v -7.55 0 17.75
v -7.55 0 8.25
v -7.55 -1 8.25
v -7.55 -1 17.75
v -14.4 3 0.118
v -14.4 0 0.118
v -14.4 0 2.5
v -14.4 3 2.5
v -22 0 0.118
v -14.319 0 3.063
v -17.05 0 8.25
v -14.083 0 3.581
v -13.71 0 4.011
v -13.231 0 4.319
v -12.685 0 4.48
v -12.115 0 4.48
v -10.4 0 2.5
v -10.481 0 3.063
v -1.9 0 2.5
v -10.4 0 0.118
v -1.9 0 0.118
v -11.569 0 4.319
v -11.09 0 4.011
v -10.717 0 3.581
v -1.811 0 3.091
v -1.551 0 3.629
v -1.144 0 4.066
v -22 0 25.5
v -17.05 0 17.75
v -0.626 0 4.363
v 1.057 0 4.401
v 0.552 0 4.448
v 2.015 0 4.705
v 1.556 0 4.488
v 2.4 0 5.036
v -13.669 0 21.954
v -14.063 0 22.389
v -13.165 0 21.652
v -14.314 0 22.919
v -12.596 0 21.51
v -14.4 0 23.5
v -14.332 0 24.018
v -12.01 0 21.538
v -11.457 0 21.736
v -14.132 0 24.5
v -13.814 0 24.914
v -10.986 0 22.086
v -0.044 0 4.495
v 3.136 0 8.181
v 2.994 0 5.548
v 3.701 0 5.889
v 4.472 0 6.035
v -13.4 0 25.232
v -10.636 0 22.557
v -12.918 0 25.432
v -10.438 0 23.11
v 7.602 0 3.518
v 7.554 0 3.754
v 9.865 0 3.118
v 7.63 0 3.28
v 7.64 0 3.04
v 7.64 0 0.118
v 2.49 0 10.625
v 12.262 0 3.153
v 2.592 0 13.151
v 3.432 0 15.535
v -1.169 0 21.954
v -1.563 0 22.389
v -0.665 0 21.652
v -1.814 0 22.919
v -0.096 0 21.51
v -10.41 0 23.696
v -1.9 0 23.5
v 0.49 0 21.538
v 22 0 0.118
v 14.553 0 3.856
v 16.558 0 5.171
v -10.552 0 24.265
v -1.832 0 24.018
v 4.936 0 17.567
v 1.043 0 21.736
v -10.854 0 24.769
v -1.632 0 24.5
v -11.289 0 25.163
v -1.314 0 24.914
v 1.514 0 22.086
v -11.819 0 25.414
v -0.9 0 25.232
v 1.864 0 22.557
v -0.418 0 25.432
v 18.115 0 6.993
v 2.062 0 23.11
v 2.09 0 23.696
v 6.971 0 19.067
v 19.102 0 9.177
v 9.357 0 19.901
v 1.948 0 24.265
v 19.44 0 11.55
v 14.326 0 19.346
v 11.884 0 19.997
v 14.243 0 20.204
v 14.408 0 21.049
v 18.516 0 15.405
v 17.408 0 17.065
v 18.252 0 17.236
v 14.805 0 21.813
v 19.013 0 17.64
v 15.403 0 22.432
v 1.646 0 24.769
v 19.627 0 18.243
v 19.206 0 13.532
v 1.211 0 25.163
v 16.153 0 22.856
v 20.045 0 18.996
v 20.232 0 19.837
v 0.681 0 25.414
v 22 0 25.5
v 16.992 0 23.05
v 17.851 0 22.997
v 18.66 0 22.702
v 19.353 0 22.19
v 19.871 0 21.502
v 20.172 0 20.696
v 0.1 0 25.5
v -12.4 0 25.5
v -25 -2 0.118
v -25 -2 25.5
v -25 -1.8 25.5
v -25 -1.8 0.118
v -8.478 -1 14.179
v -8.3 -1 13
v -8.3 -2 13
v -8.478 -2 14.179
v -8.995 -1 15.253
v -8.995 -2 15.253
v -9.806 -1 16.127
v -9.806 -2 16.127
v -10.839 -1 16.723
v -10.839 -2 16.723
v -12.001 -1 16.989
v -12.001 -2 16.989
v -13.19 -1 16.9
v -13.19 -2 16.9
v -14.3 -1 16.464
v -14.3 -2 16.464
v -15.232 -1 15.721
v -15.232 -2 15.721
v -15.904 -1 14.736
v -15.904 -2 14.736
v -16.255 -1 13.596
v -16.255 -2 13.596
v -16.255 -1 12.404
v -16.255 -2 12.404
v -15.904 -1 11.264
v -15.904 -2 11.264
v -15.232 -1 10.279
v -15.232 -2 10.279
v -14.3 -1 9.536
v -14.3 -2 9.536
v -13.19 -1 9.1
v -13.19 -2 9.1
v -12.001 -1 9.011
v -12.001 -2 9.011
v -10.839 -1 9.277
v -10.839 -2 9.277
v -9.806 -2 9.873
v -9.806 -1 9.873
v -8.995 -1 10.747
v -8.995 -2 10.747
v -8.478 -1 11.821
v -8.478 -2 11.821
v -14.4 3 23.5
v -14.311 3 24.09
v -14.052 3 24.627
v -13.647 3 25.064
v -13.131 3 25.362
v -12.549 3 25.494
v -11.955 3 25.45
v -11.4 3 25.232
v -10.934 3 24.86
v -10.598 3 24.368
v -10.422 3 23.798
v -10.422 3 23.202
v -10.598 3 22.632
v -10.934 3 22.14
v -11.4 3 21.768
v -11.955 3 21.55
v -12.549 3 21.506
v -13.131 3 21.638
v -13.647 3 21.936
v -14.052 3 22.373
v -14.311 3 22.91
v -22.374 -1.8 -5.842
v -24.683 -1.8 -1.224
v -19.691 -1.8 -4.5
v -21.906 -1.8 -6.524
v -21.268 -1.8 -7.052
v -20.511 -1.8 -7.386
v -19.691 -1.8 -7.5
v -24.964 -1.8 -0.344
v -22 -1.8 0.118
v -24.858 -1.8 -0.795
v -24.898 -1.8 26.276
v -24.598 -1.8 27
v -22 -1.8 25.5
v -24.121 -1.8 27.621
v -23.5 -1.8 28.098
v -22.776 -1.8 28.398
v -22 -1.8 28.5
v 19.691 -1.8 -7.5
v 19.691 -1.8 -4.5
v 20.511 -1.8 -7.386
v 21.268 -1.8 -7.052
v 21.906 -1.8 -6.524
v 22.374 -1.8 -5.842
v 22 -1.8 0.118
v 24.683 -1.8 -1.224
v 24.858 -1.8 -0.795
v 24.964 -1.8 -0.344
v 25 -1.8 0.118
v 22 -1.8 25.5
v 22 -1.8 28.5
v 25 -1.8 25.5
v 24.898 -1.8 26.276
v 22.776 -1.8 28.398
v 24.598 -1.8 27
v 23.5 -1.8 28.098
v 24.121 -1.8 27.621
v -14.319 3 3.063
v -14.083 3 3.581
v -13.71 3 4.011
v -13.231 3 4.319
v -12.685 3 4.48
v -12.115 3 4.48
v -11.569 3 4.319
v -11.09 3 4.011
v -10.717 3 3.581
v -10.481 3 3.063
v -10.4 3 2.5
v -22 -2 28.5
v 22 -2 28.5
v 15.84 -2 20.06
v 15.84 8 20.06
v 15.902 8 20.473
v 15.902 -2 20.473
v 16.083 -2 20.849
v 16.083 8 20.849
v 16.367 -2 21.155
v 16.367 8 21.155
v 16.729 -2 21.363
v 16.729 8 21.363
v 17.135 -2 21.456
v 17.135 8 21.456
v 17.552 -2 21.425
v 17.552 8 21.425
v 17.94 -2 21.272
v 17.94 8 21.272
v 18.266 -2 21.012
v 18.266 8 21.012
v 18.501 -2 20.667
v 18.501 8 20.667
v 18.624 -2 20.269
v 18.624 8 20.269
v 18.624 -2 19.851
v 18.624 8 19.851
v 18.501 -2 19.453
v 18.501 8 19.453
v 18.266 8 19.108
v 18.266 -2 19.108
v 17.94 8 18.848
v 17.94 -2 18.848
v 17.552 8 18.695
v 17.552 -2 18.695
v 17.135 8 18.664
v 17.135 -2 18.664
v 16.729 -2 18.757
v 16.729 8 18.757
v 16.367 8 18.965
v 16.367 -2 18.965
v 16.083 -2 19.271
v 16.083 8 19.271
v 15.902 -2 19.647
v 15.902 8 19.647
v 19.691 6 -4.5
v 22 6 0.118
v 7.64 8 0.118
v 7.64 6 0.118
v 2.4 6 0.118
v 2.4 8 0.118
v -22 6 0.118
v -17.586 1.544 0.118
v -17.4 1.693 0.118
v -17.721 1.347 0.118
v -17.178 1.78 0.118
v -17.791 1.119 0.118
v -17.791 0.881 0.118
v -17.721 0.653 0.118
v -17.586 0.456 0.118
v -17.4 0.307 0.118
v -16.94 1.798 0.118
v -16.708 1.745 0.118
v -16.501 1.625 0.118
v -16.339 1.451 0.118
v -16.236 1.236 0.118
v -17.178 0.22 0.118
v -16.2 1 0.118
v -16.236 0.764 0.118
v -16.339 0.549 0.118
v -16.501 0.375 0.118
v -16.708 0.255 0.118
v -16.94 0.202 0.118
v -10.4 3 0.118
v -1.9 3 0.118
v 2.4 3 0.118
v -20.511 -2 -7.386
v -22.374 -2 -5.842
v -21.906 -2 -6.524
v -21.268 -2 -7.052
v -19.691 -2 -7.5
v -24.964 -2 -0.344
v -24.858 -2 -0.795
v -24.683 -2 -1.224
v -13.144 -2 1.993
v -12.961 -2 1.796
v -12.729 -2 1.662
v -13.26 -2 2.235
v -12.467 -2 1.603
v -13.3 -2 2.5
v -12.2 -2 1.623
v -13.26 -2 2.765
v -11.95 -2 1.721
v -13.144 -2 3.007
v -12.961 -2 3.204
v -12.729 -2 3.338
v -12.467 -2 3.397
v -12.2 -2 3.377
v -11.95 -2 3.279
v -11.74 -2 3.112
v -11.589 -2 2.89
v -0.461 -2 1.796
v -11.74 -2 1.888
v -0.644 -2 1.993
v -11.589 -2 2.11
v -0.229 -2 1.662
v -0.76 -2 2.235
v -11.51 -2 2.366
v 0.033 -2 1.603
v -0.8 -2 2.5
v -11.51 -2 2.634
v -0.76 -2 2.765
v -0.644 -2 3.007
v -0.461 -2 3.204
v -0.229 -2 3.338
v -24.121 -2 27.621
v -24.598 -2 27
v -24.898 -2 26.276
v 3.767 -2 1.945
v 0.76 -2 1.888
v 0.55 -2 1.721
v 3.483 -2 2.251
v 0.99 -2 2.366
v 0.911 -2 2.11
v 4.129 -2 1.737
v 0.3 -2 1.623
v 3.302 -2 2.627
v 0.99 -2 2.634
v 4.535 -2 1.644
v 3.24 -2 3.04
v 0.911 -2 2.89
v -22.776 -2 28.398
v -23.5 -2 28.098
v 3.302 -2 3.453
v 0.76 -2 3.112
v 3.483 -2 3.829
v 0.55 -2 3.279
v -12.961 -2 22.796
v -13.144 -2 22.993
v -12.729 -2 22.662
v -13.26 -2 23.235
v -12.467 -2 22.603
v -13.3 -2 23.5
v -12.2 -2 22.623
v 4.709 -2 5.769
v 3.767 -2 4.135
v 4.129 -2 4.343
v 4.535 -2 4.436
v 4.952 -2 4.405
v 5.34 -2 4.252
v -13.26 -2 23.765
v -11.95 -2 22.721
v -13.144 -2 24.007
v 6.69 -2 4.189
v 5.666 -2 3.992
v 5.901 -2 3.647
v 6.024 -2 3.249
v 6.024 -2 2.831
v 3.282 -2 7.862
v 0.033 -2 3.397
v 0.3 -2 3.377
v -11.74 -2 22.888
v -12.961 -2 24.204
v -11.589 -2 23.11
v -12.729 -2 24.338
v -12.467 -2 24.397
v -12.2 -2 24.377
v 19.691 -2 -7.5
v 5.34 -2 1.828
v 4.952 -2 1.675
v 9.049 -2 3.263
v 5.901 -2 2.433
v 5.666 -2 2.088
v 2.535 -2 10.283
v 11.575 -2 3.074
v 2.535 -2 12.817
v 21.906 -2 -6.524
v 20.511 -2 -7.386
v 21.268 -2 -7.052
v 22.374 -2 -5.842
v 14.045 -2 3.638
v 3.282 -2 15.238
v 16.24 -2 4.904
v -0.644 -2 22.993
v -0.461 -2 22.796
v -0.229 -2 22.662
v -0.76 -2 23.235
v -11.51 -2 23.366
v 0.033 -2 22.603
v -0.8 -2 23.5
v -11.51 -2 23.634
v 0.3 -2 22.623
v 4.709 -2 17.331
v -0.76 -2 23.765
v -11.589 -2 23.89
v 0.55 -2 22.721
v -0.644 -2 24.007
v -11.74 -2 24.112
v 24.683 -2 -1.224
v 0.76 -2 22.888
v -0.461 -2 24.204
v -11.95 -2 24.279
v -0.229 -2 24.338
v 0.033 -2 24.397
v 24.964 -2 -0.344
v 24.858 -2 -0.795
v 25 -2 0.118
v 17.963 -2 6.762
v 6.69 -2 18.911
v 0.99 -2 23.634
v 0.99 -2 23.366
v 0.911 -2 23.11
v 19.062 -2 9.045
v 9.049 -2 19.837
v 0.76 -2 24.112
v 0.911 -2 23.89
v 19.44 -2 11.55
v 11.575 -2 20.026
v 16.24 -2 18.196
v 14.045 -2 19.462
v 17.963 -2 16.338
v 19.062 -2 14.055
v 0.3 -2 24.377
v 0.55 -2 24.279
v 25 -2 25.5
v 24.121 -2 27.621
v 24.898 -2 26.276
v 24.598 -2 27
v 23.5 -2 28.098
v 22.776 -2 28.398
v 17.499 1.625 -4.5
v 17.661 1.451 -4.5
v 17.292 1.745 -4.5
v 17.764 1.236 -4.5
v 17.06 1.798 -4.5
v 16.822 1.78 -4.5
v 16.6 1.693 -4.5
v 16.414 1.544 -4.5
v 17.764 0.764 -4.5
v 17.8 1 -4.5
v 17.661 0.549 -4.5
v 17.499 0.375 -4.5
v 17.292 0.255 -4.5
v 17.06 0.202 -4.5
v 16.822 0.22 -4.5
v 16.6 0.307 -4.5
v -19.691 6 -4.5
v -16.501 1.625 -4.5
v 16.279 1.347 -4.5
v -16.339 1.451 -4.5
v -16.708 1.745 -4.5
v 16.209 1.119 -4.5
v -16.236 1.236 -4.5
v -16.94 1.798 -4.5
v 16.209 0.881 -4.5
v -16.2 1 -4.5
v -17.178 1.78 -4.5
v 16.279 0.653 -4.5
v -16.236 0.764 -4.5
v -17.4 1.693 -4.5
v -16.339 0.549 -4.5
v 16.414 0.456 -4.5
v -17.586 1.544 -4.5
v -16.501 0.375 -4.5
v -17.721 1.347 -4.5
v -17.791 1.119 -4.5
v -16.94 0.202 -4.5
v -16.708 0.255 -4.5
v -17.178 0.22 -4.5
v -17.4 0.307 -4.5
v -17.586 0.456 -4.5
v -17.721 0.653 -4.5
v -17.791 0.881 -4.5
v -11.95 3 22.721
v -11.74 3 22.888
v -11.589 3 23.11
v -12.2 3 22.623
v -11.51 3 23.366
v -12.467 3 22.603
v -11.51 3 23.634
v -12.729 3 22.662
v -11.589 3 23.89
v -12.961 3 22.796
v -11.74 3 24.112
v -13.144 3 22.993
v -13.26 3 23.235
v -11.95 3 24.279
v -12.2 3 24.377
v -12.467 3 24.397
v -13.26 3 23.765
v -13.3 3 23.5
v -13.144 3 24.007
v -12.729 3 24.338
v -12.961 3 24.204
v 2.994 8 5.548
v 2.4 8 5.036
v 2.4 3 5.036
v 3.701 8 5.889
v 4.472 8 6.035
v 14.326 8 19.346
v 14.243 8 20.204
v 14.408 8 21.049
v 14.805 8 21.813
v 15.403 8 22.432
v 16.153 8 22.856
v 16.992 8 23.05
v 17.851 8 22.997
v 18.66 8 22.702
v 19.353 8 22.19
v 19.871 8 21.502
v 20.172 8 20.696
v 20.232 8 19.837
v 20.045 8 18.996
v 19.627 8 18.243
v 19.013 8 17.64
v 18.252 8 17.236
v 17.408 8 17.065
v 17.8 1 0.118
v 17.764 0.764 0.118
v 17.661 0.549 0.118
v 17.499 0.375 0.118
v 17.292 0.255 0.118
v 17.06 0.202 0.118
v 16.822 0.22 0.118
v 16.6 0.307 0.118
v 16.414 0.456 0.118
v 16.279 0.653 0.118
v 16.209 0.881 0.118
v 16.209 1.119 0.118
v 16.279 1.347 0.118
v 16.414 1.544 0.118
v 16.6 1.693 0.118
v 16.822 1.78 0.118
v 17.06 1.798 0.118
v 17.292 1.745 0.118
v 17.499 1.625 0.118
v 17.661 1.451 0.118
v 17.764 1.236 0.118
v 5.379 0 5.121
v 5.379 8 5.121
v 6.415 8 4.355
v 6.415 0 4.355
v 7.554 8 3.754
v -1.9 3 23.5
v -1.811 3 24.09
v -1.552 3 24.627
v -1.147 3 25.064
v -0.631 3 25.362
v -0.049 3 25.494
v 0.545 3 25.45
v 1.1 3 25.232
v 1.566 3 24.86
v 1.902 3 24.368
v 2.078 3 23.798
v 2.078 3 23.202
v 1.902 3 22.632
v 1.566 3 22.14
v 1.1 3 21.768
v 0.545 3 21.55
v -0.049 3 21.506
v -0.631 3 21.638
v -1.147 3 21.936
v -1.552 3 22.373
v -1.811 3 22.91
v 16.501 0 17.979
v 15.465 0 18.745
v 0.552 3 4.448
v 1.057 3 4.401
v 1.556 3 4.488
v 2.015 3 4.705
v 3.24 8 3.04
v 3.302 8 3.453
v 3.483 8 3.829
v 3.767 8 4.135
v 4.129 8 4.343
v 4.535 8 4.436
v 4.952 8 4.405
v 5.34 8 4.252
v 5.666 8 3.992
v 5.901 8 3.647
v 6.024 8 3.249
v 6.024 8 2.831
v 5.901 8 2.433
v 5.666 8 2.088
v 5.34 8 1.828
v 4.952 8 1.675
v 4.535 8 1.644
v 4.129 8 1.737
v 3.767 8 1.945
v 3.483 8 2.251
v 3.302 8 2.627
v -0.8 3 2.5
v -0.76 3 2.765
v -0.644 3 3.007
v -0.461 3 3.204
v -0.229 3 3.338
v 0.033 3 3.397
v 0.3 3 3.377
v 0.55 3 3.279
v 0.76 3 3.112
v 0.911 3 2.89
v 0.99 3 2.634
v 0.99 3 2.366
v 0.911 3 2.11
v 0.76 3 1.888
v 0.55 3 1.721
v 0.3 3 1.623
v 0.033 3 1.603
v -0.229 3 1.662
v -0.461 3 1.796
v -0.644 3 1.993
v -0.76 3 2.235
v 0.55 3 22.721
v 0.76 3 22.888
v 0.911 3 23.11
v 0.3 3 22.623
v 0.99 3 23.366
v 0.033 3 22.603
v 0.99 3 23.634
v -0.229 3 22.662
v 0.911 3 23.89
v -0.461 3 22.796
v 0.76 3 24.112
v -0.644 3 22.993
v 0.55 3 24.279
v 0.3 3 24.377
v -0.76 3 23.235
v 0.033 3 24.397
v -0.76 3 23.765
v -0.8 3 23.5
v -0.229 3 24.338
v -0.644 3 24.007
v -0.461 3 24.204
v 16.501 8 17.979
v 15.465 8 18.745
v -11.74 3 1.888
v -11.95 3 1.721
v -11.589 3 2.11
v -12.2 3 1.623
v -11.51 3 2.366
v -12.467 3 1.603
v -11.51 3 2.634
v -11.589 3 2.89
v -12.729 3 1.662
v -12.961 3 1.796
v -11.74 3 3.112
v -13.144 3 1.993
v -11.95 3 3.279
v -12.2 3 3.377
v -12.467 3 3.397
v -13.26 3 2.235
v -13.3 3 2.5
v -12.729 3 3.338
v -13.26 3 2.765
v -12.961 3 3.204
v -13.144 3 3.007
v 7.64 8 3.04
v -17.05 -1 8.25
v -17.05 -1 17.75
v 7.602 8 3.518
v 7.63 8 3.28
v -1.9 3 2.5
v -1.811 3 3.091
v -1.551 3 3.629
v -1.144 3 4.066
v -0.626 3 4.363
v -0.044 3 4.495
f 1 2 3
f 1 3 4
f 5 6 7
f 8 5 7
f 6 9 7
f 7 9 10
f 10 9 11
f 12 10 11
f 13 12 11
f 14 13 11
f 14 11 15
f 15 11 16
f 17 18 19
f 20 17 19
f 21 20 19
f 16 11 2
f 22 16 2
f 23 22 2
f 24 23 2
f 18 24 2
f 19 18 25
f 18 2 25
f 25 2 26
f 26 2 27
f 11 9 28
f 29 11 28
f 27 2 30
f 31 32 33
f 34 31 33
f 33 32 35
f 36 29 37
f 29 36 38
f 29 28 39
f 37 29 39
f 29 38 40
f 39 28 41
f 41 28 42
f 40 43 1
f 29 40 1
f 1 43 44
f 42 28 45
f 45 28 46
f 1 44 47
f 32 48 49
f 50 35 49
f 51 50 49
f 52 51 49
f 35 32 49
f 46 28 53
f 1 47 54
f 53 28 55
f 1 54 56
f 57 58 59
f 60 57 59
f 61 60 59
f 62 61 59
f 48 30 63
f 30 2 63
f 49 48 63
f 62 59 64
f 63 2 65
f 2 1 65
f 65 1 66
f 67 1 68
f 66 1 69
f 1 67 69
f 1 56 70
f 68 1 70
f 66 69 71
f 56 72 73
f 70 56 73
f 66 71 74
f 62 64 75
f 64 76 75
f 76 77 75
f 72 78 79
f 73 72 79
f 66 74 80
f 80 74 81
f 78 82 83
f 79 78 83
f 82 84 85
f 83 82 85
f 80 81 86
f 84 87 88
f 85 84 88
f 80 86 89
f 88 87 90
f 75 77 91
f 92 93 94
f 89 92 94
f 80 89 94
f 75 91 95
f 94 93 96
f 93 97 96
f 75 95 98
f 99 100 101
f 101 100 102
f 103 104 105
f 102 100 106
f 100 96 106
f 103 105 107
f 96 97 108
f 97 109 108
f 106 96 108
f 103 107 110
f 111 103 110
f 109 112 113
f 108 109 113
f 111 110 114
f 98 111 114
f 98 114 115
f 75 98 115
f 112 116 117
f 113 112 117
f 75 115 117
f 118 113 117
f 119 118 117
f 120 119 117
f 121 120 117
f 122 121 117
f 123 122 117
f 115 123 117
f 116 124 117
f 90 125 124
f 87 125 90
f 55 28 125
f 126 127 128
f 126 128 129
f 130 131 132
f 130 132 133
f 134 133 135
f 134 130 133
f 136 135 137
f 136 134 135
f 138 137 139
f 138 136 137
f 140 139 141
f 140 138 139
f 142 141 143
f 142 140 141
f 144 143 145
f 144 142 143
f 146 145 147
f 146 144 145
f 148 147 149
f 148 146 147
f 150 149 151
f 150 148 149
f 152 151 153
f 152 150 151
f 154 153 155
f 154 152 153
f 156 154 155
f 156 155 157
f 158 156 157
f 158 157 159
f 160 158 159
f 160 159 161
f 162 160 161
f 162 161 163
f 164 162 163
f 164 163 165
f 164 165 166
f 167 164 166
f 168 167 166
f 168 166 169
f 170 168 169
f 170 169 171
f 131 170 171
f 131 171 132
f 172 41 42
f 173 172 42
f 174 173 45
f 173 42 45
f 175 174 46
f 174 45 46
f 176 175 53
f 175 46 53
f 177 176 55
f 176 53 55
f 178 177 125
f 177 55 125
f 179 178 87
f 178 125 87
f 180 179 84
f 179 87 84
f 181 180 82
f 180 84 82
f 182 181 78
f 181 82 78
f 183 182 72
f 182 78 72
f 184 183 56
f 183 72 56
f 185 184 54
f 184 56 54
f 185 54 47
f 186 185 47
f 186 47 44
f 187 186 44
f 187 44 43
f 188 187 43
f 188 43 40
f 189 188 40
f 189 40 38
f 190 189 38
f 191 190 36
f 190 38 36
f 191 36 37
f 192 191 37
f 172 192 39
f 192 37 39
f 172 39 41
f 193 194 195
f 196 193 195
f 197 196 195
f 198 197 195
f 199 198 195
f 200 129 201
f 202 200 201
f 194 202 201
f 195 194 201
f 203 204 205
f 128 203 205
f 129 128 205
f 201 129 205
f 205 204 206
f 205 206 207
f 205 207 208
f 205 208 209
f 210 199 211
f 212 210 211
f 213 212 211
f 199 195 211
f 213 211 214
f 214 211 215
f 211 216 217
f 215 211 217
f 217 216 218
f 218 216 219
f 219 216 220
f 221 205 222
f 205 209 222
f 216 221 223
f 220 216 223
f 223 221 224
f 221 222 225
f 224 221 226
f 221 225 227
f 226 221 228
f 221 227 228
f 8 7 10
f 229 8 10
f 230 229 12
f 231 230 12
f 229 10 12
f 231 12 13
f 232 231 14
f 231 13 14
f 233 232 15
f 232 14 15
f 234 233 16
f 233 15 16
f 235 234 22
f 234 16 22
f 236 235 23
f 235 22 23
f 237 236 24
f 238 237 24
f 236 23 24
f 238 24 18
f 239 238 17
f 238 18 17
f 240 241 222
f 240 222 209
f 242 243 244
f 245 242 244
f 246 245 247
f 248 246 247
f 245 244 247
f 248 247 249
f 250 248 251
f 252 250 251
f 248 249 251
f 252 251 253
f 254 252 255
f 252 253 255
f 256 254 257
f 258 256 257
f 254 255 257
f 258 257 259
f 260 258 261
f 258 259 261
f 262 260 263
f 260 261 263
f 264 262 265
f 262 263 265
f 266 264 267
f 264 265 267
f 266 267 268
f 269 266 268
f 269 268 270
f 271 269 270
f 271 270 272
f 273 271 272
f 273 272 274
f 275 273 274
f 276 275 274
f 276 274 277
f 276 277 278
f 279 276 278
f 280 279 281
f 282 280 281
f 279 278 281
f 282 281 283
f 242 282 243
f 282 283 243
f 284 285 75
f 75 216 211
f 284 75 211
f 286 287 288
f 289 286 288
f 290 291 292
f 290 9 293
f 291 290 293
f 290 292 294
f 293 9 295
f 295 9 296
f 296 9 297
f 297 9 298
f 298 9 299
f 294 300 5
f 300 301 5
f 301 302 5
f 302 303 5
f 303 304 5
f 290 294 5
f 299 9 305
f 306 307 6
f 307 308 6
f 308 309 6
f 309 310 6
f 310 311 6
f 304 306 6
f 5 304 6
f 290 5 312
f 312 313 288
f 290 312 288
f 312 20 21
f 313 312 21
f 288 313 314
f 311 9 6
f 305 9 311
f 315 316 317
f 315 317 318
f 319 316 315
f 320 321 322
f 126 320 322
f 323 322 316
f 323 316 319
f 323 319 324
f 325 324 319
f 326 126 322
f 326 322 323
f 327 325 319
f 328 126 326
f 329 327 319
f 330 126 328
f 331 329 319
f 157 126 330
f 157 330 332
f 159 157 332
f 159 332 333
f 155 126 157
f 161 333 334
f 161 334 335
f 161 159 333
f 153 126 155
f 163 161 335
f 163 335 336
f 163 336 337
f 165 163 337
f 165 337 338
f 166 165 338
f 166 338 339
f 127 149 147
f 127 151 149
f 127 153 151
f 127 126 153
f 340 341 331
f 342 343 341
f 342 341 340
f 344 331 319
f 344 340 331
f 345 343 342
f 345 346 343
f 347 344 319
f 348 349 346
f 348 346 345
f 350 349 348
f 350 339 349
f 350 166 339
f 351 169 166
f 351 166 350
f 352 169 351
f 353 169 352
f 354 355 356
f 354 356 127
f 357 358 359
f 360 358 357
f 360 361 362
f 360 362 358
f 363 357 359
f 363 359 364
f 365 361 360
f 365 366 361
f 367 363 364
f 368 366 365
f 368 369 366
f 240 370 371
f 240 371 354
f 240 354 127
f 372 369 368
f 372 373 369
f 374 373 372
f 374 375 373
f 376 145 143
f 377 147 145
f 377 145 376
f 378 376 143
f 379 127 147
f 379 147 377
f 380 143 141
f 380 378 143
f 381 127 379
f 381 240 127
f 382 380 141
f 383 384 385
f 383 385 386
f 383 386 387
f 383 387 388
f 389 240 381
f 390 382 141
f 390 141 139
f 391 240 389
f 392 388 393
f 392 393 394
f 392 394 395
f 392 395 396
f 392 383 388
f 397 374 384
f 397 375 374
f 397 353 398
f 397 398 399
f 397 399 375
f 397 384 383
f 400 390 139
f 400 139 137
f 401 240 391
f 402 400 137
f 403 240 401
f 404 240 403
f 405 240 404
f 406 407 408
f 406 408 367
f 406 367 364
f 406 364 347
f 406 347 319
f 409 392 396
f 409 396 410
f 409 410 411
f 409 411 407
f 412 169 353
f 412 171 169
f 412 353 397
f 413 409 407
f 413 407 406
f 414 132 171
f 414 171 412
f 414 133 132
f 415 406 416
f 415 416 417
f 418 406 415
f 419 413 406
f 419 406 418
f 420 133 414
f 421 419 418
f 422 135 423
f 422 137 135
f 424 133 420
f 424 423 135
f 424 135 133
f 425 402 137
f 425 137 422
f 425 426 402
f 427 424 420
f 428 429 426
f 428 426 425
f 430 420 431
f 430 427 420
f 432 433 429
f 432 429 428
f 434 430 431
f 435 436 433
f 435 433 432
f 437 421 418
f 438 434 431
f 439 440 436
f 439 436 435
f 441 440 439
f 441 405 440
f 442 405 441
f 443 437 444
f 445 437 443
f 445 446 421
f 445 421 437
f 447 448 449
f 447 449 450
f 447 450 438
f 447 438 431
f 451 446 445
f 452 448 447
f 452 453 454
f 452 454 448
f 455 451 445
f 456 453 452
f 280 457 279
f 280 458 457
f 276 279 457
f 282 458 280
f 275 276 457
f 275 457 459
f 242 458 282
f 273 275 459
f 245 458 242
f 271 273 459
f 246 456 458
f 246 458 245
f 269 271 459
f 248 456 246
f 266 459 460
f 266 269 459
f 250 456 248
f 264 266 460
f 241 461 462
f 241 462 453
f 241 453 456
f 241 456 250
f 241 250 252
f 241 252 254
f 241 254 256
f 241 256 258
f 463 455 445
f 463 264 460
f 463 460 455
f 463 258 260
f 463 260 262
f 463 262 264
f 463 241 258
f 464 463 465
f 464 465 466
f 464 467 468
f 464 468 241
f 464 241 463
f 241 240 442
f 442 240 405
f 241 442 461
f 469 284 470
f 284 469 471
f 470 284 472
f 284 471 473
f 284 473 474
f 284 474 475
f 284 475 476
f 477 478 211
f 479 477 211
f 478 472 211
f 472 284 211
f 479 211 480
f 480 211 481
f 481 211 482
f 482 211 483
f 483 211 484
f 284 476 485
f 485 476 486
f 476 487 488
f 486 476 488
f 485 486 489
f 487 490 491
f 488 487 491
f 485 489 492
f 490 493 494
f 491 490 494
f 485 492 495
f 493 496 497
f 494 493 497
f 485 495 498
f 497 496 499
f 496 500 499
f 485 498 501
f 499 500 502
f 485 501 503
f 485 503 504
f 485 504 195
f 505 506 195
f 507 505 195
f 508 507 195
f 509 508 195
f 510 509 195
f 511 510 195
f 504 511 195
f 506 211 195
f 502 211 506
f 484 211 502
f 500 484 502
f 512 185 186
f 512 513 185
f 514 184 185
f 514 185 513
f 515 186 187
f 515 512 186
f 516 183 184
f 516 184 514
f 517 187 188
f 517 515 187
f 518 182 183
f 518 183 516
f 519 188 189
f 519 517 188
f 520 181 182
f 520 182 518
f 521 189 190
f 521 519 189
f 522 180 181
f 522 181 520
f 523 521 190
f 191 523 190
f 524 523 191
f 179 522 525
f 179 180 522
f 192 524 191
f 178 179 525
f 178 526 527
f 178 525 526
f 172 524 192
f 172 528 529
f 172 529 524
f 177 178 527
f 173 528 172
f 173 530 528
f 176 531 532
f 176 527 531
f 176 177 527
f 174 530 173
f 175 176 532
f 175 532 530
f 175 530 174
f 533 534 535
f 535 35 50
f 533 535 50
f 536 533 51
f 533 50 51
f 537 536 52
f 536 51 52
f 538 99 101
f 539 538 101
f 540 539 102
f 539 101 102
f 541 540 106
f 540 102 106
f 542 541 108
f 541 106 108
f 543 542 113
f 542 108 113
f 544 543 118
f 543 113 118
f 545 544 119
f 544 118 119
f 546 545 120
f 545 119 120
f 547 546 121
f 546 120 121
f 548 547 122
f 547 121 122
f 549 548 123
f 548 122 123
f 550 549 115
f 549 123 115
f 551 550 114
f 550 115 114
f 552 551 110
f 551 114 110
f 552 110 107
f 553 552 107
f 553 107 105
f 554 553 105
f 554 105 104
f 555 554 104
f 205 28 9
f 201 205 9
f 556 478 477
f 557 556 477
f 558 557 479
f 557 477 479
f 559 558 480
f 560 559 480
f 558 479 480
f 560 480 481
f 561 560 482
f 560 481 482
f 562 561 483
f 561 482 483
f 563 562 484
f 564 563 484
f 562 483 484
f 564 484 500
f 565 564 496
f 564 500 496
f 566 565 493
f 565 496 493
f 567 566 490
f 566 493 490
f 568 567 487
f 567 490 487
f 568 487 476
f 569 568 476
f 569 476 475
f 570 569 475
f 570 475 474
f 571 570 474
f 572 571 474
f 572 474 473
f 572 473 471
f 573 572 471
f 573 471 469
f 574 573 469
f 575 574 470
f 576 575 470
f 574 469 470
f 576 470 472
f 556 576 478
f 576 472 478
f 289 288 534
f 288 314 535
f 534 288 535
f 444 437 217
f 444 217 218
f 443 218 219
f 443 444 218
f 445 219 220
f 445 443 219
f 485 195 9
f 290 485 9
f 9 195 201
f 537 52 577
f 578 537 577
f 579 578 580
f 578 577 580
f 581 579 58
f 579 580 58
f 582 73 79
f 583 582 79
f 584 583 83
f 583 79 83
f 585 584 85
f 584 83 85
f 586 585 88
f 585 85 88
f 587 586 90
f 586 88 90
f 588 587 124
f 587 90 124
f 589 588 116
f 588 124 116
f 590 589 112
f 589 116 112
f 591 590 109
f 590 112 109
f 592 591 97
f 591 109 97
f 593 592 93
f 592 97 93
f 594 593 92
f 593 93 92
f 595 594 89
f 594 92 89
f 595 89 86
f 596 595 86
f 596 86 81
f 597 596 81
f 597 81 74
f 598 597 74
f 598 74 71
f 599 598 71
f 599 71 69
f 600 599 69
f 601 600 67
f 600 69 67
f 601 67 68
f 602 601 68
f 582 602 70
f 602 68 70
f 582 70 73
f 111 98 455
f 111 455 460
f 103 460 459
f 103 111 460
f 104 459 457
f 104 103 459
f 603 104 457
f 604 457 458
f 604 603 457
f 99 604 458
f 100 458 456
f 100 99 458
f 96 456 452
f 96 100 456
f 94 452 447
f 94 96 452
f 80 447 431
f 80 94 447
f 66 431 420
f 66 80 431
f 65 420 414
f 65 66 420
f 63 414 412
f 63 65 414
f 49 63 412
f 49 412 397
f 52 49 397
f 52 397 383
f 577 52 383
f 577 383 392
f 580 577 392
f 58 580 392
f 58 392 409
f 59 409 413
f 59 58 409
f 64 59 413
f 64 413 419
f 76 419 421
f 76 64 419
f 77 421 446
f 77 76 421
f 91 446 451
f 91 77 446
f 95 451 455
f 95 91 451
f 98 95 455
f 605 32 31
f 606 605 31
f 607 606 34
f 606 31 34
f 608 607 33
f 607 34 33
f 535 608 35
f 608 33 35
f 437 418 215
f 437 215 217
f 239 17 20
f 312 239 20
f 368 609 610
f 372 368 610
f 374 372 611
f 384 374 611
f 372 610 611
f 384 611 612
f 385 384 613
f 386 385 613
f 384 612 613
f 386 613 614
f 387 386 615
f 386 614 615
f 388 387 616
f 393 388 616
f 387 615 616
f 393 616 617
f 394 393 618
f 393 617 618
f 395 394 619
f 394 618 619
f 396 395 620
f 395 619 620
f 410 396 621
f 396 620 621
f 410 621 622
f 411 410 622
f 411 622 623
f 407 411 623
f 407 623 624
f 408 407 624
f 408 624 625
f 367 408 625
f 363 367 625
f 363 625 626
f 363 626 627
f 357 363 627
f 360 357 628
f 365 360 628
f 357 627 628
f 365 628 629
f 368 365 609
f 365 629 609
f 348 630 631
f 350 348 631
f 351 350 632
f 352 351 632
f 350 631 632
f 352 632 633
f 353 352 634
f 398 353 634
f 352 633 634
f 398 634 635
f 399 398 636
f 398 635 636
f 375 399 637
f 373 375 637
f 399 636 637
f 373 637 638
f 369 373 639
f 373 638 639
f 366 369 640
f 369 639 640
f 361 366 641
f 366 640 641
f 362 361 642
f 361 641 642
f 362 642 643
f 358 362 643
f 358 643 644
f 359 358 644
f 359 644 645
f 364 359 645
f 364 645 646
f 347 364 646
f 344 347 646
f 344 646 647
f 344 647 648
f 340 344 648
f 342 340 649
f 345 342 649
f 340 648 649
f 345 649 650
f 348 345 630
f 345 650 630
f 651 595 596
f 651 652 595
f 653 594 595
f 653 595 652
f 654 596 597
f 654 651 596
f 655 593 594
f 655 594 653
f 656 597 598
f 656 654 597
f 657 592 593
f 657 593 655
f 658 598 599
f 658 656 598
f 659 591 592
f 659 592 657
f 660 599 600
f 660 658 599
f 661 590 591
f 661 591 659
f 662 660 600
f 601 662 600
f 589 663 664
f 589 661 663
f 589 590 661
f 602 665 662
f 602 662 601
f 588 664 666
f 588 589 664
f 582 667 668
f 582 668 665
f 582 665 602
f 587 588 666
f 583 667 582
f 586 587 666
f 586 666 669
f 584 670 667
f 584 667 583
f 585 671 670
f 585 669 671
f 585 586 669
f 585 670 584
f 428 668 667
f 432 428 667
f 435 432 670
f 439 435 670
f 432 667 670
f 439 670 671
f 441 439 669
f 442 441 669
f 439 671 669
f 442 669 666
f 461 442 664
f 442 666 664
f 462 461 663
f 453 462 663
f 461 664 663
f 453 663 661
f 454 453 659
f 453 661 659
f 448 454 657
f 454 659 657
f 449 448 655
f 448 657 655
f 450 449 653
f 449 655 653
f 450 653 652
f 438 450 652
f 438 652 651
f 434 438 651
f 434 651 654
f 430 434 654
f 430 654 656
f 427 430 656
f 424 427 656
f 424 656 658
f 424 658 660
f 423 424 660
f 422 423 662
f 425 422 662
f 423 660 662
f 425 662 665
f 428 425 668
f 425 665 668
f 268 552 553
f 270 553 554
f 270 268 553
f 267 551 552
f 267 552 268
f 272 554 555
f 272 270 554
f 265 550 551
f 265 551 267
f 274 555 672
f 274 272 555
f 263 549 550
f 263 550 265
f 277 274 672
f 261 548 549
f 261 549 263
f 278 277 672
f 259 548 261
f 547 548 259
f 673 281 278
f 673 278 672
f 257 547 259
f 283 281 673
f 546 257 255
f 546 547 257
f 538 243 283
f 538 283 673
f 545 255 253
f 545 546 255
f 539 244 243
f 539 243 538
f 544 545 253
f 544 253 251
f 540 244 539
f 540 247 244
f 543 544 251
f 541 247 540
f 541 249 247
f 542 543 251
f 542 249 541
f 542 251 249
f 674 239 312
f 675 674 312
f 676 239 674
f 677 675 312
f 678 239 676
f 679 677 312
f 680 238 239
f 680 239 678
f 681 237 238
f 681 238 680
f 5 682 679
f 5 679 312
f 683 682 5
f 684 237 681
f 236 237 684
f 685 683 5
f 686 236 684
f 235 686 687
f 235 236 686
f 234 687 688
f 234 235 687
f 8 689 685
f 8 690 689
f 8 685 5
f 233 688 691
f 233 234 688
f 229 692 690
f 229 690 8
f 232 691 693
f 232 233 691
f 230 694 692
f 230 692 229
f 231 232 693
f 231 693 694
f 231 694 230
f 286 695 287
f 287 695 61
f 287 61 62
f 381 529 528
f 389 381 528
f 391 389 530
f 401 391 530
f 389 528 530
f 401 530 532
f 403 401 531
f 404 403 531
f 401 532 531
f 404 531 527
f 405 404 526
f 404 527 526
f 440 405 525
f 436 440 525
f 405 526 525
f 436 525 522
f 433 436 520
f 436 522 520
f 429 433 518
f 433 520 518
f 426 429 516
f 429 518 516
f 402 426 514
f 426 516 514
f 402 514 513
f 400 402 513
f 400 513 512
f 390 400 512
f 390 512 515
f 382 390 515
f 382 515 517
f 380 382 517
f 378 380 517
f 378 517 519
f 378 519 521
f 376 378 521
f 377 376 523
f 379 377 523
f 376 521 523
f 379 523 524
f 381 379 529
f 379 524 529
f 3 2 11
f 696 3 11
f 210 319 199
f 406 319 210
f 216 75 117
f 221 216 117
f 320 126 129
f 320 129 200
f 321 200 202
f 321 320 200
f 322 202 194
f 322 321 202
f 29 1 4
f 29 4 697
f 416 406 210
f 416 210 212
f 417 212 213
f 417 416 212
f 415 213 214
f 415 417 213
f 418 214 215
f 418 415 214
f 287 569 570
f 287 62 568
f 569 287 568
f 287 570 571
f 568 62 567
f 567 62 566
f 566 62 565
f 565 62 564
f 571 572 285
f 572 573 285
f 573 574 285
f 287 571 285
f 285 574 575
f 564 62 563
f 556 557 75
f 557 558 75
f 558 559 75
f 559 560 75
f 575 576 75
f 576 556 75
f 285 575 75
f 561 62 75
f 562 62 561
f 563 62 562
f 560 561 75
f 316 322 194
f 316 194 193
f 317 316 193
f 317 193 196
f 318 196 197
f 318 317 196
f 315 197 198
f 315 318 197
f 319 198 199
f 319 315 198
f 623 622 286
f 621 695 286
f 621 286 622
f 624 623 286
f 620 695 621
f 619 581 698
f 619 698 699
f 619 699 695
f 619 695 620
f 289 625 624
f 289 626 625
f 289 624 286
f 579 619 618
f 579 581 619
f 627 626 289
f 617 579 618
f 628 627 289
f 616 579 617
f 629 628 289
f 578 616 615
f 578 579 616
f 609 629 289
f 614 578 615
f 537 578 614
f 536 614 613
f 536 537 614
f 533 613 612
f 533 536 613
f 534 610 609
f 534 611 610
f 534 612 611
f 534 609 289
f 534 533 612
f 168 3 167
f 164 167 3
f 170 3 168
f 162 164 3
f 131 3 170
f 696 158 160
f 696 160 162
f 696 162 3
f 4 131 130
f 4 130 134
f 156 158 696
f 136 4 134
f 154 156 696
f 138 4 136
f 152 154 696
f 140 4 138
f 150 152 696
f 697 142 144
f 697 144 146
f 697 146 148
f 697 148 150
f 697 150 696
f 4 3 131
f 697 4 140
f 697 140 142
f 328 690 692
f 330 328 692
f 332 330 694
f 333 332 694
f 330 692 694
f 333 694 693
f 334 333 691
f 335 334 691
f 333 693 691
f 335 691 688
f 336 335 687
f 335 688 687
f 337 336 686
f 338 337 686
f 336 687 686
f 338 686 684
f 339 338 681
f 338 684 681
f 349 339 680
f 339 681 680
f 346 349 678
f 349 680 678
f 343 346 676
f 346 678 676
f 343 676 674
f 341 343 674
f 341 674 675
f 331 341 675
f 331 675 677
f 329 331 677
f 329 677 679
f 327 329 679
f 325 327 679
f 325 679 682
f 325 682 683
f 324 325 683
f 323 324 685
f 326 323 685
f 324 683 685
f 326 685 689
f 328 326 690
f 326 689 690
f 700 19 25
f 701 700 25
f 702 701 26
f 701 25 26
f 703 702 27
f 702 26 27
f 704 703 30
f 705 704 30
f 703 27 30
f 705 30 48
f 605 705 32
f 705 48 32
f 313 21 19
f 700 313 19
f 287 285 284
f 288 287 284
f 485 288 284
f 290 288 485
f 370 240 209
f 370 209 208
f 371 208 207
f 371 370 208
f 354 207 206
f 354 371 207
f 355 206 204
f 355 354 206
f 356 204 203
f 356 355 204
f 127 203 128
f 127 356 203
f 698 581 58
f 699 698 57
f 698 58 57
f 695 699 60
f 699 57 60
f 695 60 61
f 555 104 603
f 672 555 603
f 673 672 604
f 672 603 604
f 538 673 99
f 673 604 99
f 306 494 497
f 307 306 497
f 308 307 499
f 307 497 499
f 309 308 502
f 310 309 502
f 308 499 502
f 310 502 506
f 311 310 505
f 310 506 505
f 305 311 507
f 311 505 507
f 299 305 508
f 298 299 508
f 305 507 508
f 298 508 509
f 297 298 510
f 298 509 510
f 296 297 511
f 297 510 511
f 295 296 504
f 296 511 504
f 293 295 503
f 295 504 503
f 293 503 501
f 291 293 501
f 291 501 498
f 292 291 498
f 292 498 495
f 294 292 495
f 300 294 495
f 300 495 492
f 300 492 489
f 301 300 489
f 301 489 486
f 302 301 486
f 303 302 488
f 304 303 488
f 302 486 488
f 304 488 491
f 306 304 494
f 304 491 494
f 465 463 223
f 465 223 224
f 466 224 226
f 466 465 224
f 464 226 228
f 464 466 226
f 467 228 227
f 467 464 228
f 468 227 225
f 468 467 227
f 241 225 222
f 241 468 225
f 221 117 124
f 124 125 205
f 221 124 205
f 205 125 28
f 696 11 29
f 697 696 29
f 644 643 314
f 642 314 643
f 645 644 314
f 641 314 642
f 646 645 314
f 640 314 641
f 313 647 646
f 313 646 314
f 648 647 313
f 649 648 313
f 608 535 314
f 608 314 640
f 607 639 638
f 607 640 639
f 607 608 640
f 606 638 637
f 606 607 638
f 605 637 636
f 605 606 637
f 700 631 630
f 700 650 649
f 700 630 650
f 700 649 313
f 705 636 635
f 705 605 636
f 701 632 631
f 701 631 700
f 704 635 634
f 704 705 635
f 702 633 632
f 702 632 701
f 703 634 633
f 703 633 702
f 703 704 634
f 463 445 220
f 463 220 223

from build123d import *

# Parameters (mm, degrees)
F1_R      = 4
F1_R_2    = 8.5
F2_DEPTH  = 2
F4_DEPTH  = 6
F5_R      = 0.8
F6_DEPTH  = 4.618034
F8_DEPTH  = 8
F9_R      = 1.4
F10_DEPTH = 10
F11_R     = 2
F12_DEPTH = 3
F13_W     = 9.5
F13_H     = 9.5
F13_R     = 4
F14_DEPTH = 1
F15_R     = 0.9
F16_DEPTH = 5
F18_DEPTH = 0.2


with BuildPart() as f2:
    # F1 (on Front) → F2 (new body)
    with BuildSketch(Plane.XZ):
        Polygon((-22, 25.5), (-22, 0.118034), (-19.690983, -4.5), (19.690983, -4.5), (22, 0.118034), (22, 25.5), align=None)
        with Locations((-12.3, 13)):
            Circle(F1_R, mode=Mode.SUBTRACT)
        with Locations((10.94, 11.55)):
            Circle(F1_R_2, mode=Mode.SUBTRACT)
    extrude(amount=F2_DEPTH)

    # F3 (on face) → F4 (join)
    with BuildSketch(Plane(origin=(0, 0, 0), x_dir=(-1, 0, 0), z_dir=(0, 1, 0))):
        Polygon((22, 0.118034), (-22, 0.118034), (-19.690983, -4.5), (19.690983, -4.5), align=None)
    extrude(amount=F4_DEPTH)

    # F5 (on face) → F6 (cut, through all)
    with BuildSketch(Plane(origin=(0, 0, -4.5), x_dir=(1, 0, 0), z_dir=(0, 0, -1))):
        with Locations((-17, -1)):
            Circle(F5_R)
        with Locations((17, -1)):
            Circle(F5_R)
    extrude(amount=-F6_DEPTH, mode=Mode.SUBTRACT)

    # F7 (on face) → F8 (join)
    with BuildSketch(Plane(origin=(0, 0, 0), x_dir=(-1, 0, 0), z_dir=(0, 1, 0))):
        with BuildLine():
            ThreePointArc((-17.408219, 17.06472), (-15.997514, 18.381658), (-14.326099, 19.346431))
            ThreePointArc((-14.326099, 19.346431), (-19.025005, 22.471173), (-17.408219, 17.06472))
        make_face()
        with BuildLine():
            ThreePointArc((-4.471781, 6.03528), (-5.882486, 4.718342), (-7.553901, 3.753569))
            ThreePointArc((-7.553901, 3.753569), (-7.618397, 3.399372), (-7.64, 3.04))
            Line((-7.64, 3.04), (-7.64, 0.118034))
            Line((-7.64, 0.118034), (-2.4, 0.118034))
            Line((-2.4, 0.118034), (-2.4, 5.035595))
            ThreePointArc((-2.4, 5.035595), (-3.336266, 5.741903), (-4.471781, 6.03528))
        make_face()
    extrude(amount=F8_DEPTH)

    # F9 (on face) → F10 (cut, through all)
    with BuildSketch(Plane(origin=(0, 8, 0), x_dir=(-1, 0, 0), z_dir=(0, 1, 0))):
        with Locations((-17.24, 20.06)):
            Circle(F9_R)
        with Locations((-4.64, 3.04)):
            Circle(F9_R)
    extrude(amount=-F10_DEPTH, mode=Mode.SUBTRACT)

    # F11 (on face) → F12 (join)
    with BuildSketch(Plane(origin=(0, 0, 0), x_dir=(-1, 0, 0), z_dir=(0, 1, 0))):
        with Locations((-0.1, 23.5)):
            Circle(F11_R)
        with Locations((12.4, 23.5)):
            Circle(F11_R)
        with BuildLine():
            Line((1.9, 0.118034), (1.9, 2.5))
            ThreePointArc((1.9, 2.5), (1.144335, 4.065768), (-0.55163, 4.44834))
            ThreePointArc((-0.55163, 4.44834), (-1.556353, 4.488475), (-2.4, 5.035595))
            Line((-2.4, 5.035595), (-2.4, 0.118034))
            Line((-2.4, 0.118034), (1.9, 0.118034))
        make_face()
        with BuildLine():
            Line((14.4, 0.118034), (14.4, 2.5))
            ThreePointArc((14.4, 2.5), (12.4, 4.5), (10.4, 2.5))
            Line((10.4, 2.5), (10.4, 0.118034))
            Line((10.4, 0.118034), (14.4, 0.118034))
        make_face()
    extrude(amount=F12_DEPTH)

    # F13 (on face) → F14 (cut)
    with BuildSketch(Plane(origin=(0, 0, 0), x_dir=(-1, 0, 0), z_dir=(0, 1, 0))):
        with Locations((12.3, 13)):
            Rectangle(F13_W, F13_H)
        with Locations((12.3, 13)):
            Circle(F13_R, mode=Mode.SUBTRACT)
    extrude(amount=-F14_DEPTH, mode=Mode.SUBTRACT)

    # F15 (on face) → F16 (cut, through all)
    with BuildSketch(Plane(origin=(0, 3, 0), x_dir=(-1, 0, 0), z_dir=(0, 1, 0))):
        with Locations((-0.1, 23.5)):
            Circle(F15_R)
        with Locations((12.4, 23.5)):
            Circle(F15_R)
        with Locations((-0.1, 2.5)):
            Circle(F15_R)
        with Locations((12.4, 2.5)):
            Circle(F15_R)
    extrude(amount=-F16_DEPTH, mode=Mode.SUBTRACT)

    # F17 (on face) → F18 (join)
    with BuildSketch(Plane.XZ.offset(2)):
        with BuildLine():
            ThreePointArc((-22, 28.5), (-24.12132, 27.62132), (-25, 25.5))
            Line((-25, 25.5), (-25, 0.118034))
            ThreePointArc((-25, 0.118034), (-24.919747, -0.571225), (-24.683282, -1.223607))
            Line((-24.683282, -1.223607), (-22.374265, -5.841641))
            ThreePointArc((-22.374265, -5.841641), (-21.268176, -7.051952), (-19.690983, -7.5))
            Line((-19.690983, -7.5), (19.690983, -7.5))
            ThreePointArc((19.690983, -7.5), (21.268176, -7.051952), (22.374265, -5.841641))
            Line((22.374265, -5.841641), (24.683282, -1.223607))
            ThreePointArc((24.683282, -1.223607), (24.919747, -0.571225), (25, 0.118034))
            Line((25, 0.118034), (25, 25.5))
            ThreePointArc((25, 25.5), (24.12132, 27.62132), (22, 28.5))
            Line((22, 28.5), (-22, 28.5))
        make_face()
        Polygon((-22, 0.118034), (-22, 25.5), (22, 25.5), (22, 0.118034), (19.690983, -4.5), (-19.690983, -4.5), align=None, mode=Mode.SUBTRACT)
    extrude(amount=-F18_DEPTH)


solid = f2.part
